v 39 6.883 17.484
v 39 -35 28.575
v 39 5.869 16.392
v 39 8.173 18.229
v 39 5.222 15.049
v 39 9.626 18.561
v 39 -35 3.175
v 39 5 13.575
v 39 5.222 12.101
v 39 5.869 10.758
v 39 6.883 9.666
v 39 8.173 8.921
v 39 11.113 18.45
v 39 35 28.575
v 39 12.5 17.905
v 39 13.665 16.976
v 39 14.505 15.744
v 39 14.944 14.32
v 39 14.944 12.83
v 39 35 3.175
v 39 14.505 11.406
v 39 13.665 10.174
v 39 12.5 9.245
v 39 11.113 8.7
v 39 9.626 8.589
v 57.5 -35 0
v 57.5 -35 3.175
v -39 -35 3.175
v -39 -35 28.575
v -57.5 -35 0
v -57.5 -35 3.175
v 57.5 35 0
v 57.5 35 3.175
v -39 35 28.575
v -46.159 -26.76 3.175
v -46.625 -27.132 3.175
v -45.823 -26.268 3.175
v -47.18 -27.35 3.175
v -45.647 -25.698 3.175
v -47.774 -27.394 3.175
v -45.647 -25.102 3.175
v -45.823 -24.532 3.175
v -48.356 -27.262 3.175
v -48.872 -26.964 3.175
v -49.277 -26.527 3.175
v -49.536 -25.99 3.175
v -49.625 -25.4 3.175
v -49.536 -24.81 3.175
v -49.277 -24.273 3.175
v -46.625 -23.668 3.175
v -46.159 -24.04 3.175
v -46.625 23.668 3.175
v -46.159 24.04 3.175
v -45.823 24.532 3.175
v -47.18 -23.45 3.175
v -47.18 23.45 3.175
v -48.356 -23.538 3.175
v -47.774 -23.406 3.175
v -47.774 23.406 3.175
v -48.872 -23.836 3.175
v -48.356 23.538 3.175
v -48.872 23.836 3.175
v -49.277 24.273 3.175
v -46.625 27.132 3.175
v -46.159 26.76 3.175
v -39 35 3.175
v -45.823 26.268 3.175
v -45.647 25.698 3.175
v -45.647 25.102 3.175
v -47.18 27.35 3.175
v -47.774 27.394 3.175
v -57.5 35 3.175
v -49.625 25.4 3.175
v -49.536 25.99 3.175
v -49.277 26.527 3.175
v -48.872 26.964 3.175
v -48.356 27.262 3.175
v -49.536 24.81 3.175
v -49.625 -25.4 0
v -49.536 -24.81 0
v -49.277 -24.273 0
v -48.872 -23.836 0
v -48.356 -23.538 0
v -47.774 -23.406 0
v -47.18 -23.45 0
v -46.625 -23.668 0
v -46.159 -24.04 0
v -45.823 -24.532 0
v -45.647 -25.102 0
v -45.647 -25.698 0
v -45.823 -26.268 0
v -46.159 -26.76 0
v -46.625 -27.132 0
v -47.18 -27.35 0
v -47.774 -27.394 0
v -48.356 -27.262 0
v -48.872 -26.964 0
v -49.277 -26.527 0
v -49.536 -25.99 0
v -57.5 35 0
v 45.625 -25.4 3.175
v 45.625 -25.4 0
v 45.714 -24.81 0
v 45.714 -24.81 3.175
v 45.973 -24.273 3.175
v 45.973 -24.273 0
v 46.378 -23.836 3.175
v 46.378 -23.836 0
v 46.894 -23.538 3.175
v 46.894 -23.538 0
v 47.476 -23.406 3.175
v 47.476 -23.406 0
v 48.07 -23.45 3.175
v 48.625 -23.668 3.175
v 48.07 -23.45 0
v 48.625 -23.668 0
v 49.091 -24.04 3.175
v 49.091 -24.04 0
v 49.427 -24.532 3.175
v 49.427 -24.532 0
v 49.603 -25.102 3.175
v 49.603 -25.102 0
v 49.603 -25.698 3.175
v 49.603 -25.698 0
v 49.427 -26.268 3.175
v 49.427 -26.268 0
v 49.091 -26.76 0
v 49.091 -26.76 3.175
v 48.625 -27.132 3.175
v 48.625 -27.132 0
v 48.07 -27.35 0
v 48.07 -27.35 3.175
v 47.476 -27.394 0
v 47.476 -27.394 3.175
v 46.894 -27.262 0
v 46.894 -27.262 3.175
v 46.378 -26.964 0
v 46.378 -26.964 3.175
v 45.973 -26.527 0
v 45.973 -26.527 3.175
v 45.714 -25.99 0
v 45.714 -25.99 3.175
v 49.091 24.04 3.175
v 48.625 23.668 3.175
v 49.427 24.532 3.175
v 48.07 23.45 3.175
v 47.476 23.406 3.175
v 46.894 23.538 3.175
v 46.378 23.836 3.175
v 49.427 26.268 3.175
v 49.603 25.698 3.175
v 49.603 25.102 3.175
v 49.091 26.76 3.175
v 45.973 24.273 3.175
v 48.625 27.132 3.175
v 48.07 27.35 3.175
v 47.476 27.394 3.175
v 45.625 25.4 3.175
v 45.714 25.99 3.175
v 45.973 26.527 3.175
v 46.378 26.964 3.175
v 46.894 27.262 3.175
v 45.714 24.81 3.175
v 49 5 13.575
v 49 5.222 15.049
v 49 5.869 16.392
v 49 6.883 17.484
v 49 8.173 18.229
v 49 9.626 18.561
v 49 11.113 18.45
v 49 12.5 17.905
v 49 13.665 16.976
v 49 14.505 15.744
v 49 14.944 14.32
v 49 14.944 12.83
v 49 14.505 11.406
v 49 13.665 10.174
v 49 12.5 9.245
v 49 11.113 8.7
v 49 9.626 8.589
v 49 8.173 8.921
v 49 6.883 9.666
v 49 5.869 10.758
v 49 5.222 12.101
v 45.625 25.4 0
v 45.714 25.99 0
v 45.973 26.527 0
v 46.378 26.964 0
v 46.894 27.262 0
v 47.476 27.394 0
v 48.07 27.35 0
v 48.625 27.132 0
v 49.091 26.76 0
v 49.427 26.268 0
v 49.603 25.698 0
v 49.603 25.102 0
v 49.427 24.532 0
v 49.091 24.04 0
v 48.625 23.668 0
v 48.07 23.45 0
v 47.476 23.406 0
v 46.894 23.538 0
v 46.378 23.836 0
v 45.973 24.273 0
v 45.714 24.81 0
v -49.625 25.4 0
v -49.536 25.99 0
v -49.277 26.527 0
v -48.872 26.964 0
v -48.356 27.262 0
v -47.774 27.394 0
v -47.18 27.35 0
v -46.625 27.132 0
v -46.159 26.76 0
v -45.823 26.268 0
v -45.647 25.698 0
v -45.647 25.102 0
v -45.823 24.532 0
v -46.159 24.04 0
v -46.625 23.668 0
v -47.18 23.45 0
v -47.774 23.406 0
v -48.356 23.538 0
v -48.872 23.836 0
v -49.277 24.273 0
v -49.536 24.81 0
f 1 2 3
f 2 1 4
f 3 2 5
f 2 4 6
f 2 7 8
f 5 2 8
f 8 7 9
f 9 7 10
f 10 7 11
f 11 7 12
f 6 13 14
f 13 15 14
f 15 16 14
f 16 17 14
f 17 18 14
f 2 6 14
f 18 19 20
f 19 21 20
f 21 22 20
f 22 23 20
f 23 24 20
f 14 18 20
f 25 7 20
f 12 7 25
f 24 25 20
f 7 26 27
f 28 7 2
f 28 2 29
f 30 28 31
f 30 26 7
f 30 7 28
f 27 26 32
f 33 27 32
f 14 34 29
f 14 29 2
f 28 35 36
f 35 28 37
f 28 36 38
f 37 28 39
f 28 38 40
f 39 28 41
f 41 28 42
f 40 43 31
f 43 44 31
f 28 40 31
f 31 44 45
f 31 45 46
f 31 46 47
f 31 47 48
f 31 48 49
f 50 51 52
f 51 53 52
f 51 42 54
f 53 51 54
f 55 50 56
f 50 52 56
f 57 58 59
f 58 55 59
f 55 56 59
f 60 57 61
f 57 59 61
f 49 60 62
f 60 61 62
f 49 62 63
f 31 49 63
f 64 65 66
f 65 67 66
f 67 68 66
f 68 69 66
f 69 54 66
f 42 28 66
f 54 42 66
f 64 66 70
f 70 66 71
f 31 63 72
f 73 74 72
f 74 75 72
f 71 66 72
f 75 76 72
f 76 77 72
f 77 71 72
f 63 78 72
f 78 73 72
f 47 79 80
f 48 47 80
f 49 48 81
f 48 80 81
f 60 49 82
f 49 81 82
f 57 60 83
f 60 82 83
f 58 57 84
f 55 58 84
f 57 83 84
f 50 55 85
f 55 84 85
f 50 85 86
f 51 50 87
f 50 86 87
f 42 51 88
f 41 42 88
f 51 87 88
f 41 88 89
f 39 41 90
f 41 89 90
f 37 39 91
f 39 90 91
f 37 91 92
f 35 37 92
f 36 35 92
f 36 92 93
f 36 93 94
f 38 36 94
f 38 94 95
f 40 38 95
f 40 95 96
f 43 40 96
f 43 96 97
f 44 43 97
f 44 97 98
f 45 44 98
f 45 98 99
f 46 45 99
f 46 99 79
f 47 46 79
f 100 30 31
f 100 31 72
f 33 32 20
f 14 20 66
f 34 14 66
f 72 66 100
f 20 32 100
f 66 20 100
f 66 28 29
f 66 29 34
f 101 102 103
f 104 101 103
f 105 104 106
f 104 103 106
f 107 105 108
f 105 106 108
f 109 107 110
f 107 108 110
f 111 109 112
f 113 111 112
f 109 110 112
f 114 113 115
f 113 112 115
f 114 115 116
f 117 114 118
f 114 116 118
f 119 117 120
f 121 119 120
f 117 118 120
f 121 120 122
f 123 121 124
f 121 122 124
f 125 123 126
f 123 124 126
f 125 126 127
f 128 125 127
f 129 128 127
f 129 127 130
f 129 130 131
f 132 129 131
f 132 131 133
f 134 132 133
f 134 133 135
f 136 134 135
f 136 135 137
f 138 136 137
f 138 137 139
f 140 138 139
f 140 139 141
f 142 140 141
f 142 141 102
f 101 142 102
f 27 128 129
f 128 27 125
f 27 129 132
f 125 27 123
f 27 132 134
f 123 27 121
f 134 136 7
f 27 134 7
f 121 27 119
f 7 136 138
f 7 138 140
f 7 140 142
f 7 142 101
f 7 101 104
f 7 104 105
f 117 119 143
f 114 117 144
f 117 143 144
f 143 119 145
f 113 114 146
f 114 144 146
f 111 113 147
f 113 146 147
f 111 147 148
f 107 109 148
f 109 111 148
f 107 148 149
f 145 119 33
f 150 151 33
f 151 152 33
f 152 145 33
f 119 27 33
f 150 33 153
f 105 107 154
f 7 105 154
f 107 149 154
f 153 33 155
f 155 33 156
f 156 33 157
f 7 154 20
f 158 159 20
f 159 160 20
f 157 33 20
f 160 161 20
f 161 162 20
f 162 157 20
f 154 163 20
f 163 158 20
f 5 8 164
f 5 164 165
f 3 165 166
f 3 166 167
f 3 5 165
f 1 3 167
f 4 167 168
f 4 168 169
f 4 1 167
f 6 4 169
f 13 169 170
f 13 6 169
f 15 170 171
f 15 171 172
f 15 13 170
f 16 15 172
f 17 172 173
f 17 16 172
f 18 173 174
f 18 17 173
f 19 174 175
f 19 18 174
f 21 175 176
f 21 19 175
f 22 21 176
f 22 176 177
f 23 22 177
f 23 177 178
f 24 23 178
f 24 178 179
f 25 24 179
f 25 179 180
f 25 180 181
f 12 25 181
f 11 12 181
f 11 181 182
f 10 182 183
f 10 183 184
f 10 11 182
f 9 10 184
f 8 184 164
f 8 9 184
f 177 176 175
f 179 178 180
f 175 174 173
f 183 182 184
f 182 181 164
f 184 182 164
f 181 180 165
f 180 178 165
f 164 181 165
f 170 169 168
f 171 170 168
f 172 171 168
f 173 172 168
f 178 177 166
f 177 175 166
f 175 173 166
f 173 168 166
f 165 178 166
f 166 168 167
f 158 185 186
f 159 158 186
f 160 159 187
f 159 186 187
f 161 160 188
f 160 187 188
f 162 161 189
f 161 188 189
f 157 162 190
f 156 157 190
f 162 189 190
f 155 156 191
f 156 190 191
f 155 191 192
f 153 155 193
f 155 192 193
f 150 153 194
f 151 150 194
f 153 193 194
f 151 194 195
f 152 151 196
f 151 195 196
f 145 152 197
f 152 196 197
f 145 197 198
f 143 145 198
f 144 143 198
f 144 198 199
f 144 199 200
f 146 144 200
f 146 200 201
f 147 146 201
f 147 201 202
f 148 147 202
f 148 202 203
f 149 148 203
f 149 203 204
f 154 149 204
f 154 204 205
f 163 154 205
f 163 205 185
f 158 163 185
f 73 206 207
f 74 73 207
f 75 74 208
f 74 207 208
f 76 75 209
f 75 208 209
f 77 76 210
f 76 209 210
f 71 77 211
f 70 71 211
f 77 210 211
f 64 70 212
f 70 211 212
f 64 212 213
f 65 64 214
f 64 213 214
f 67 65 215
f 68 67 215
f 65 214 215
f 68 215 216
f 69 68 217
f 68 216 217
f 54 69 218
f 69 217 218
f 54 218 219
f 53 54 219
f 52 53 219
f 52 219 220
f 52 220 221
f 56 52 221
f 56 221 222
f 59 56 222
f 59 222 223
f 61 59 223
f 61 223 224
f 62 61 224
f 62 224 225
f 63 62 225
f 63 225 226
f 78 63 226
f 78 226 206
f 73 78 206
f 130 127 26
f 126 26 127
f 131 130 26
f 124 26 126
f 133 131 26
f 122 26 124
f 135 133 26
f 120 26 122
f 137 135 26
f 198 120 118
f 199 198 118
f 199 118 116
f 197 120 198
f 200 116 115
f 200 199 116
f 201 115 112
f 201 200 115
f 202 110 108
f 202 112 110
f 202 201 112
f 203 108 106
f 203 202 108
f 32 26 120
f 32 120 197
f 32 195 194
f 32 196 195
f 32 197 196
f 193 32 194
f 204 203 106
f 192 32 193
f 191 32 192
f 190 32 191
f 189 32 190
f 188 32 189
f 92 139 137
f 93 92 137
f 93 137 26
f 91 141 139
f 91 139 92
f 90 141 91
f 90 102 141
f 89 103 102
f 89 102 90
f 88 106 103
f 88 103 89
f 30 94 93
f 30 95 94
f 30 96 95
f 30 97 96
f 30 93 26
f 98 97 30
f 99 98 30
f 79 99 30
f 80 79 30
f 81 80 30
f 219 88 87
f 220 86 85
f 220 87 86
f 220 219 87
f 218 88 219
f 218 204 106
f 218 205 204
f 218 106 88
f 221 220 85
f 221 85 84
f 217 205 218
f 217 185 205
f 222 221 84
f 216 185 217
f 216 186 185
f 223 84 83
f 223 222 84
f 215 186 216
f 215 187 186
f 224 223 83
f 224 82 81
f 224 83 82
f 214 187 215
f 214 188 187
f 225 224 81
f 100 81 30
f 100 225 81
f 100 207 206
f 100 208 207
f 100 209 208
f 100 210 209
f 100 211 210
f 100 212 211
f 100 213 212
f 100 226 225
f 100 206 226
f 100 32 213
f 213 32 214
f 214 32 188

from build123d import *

# Parameters (mm, degrees)
SKETCH1_W           = 78
SKETCH1_H           = 70
BOSS_EXTRUDE1_DEPTH = 28.575
SKETCH2_W           = 115
SKETCH2_H           = 70
BOSS_EXTRUDE2_DEPTH = 3.175
SKETCH3_R           = 2
CUT_EXTRUDE1_DEPTH  = 74.128521283
SKETCH4_R           = 5
BOSS_EXTRUDE3_DEPTH = 10


with BuildPart() as part:
    # Sketch1 → Boss-Extrude1 (new body)
    with BuildSketch(Plane.XY):
        Rectangle(SKETCH1_W, SKETCH1_H)
    extrude(amount=BOSS_EXTRUDE1_DEPTH)

    # Sketch2 → Boss-Extrude2 (add)
    with BuildSketch(Plane(origin=(0, 0, 0), x_dir=(-1, 0, 0), z_dir=(0, 0, -1))):
        Rectangle(SKETCH2_W, SKETCH2_H)
    extrude(amount=-BOSS_EXTRUDE2_DEPTH)

    # Sketch3 → Cut-Extrude1 (cut, through all)
    with BuildSketch(Plane(origin=(0, 0, 0), x_dir=(-1, 0, 0), z_dir=(0, 0, -1))):
        with Locations((-47.625, 25.4)):
            Circle(SKETCH3_R)
        with Locations((47.625, 25.4)):
            Circle(SKETCH3_R)
        with Locations((47.625, -25.4)):
            Circle(SKETCH3_R)
        with Locations((-47.625, -25.4)):
            Circle(SKETCH3_R)
    extrude(amount=-CUT_EXTRUDE1_DEPTH, mode=Mode.SUBTRACT)

    # Sketch4 → Boss-Extrude3 (add)
    with BuildSketch(Plane.ZY.offset(-39)):
        with Locations(Location((13.575, 10, 0), (0, 0, 270))):
            Circle(SKETCH4_R)
    extrude(amount=-BOSS_EXTRUDE3_DEPTH)


solid = part.part
